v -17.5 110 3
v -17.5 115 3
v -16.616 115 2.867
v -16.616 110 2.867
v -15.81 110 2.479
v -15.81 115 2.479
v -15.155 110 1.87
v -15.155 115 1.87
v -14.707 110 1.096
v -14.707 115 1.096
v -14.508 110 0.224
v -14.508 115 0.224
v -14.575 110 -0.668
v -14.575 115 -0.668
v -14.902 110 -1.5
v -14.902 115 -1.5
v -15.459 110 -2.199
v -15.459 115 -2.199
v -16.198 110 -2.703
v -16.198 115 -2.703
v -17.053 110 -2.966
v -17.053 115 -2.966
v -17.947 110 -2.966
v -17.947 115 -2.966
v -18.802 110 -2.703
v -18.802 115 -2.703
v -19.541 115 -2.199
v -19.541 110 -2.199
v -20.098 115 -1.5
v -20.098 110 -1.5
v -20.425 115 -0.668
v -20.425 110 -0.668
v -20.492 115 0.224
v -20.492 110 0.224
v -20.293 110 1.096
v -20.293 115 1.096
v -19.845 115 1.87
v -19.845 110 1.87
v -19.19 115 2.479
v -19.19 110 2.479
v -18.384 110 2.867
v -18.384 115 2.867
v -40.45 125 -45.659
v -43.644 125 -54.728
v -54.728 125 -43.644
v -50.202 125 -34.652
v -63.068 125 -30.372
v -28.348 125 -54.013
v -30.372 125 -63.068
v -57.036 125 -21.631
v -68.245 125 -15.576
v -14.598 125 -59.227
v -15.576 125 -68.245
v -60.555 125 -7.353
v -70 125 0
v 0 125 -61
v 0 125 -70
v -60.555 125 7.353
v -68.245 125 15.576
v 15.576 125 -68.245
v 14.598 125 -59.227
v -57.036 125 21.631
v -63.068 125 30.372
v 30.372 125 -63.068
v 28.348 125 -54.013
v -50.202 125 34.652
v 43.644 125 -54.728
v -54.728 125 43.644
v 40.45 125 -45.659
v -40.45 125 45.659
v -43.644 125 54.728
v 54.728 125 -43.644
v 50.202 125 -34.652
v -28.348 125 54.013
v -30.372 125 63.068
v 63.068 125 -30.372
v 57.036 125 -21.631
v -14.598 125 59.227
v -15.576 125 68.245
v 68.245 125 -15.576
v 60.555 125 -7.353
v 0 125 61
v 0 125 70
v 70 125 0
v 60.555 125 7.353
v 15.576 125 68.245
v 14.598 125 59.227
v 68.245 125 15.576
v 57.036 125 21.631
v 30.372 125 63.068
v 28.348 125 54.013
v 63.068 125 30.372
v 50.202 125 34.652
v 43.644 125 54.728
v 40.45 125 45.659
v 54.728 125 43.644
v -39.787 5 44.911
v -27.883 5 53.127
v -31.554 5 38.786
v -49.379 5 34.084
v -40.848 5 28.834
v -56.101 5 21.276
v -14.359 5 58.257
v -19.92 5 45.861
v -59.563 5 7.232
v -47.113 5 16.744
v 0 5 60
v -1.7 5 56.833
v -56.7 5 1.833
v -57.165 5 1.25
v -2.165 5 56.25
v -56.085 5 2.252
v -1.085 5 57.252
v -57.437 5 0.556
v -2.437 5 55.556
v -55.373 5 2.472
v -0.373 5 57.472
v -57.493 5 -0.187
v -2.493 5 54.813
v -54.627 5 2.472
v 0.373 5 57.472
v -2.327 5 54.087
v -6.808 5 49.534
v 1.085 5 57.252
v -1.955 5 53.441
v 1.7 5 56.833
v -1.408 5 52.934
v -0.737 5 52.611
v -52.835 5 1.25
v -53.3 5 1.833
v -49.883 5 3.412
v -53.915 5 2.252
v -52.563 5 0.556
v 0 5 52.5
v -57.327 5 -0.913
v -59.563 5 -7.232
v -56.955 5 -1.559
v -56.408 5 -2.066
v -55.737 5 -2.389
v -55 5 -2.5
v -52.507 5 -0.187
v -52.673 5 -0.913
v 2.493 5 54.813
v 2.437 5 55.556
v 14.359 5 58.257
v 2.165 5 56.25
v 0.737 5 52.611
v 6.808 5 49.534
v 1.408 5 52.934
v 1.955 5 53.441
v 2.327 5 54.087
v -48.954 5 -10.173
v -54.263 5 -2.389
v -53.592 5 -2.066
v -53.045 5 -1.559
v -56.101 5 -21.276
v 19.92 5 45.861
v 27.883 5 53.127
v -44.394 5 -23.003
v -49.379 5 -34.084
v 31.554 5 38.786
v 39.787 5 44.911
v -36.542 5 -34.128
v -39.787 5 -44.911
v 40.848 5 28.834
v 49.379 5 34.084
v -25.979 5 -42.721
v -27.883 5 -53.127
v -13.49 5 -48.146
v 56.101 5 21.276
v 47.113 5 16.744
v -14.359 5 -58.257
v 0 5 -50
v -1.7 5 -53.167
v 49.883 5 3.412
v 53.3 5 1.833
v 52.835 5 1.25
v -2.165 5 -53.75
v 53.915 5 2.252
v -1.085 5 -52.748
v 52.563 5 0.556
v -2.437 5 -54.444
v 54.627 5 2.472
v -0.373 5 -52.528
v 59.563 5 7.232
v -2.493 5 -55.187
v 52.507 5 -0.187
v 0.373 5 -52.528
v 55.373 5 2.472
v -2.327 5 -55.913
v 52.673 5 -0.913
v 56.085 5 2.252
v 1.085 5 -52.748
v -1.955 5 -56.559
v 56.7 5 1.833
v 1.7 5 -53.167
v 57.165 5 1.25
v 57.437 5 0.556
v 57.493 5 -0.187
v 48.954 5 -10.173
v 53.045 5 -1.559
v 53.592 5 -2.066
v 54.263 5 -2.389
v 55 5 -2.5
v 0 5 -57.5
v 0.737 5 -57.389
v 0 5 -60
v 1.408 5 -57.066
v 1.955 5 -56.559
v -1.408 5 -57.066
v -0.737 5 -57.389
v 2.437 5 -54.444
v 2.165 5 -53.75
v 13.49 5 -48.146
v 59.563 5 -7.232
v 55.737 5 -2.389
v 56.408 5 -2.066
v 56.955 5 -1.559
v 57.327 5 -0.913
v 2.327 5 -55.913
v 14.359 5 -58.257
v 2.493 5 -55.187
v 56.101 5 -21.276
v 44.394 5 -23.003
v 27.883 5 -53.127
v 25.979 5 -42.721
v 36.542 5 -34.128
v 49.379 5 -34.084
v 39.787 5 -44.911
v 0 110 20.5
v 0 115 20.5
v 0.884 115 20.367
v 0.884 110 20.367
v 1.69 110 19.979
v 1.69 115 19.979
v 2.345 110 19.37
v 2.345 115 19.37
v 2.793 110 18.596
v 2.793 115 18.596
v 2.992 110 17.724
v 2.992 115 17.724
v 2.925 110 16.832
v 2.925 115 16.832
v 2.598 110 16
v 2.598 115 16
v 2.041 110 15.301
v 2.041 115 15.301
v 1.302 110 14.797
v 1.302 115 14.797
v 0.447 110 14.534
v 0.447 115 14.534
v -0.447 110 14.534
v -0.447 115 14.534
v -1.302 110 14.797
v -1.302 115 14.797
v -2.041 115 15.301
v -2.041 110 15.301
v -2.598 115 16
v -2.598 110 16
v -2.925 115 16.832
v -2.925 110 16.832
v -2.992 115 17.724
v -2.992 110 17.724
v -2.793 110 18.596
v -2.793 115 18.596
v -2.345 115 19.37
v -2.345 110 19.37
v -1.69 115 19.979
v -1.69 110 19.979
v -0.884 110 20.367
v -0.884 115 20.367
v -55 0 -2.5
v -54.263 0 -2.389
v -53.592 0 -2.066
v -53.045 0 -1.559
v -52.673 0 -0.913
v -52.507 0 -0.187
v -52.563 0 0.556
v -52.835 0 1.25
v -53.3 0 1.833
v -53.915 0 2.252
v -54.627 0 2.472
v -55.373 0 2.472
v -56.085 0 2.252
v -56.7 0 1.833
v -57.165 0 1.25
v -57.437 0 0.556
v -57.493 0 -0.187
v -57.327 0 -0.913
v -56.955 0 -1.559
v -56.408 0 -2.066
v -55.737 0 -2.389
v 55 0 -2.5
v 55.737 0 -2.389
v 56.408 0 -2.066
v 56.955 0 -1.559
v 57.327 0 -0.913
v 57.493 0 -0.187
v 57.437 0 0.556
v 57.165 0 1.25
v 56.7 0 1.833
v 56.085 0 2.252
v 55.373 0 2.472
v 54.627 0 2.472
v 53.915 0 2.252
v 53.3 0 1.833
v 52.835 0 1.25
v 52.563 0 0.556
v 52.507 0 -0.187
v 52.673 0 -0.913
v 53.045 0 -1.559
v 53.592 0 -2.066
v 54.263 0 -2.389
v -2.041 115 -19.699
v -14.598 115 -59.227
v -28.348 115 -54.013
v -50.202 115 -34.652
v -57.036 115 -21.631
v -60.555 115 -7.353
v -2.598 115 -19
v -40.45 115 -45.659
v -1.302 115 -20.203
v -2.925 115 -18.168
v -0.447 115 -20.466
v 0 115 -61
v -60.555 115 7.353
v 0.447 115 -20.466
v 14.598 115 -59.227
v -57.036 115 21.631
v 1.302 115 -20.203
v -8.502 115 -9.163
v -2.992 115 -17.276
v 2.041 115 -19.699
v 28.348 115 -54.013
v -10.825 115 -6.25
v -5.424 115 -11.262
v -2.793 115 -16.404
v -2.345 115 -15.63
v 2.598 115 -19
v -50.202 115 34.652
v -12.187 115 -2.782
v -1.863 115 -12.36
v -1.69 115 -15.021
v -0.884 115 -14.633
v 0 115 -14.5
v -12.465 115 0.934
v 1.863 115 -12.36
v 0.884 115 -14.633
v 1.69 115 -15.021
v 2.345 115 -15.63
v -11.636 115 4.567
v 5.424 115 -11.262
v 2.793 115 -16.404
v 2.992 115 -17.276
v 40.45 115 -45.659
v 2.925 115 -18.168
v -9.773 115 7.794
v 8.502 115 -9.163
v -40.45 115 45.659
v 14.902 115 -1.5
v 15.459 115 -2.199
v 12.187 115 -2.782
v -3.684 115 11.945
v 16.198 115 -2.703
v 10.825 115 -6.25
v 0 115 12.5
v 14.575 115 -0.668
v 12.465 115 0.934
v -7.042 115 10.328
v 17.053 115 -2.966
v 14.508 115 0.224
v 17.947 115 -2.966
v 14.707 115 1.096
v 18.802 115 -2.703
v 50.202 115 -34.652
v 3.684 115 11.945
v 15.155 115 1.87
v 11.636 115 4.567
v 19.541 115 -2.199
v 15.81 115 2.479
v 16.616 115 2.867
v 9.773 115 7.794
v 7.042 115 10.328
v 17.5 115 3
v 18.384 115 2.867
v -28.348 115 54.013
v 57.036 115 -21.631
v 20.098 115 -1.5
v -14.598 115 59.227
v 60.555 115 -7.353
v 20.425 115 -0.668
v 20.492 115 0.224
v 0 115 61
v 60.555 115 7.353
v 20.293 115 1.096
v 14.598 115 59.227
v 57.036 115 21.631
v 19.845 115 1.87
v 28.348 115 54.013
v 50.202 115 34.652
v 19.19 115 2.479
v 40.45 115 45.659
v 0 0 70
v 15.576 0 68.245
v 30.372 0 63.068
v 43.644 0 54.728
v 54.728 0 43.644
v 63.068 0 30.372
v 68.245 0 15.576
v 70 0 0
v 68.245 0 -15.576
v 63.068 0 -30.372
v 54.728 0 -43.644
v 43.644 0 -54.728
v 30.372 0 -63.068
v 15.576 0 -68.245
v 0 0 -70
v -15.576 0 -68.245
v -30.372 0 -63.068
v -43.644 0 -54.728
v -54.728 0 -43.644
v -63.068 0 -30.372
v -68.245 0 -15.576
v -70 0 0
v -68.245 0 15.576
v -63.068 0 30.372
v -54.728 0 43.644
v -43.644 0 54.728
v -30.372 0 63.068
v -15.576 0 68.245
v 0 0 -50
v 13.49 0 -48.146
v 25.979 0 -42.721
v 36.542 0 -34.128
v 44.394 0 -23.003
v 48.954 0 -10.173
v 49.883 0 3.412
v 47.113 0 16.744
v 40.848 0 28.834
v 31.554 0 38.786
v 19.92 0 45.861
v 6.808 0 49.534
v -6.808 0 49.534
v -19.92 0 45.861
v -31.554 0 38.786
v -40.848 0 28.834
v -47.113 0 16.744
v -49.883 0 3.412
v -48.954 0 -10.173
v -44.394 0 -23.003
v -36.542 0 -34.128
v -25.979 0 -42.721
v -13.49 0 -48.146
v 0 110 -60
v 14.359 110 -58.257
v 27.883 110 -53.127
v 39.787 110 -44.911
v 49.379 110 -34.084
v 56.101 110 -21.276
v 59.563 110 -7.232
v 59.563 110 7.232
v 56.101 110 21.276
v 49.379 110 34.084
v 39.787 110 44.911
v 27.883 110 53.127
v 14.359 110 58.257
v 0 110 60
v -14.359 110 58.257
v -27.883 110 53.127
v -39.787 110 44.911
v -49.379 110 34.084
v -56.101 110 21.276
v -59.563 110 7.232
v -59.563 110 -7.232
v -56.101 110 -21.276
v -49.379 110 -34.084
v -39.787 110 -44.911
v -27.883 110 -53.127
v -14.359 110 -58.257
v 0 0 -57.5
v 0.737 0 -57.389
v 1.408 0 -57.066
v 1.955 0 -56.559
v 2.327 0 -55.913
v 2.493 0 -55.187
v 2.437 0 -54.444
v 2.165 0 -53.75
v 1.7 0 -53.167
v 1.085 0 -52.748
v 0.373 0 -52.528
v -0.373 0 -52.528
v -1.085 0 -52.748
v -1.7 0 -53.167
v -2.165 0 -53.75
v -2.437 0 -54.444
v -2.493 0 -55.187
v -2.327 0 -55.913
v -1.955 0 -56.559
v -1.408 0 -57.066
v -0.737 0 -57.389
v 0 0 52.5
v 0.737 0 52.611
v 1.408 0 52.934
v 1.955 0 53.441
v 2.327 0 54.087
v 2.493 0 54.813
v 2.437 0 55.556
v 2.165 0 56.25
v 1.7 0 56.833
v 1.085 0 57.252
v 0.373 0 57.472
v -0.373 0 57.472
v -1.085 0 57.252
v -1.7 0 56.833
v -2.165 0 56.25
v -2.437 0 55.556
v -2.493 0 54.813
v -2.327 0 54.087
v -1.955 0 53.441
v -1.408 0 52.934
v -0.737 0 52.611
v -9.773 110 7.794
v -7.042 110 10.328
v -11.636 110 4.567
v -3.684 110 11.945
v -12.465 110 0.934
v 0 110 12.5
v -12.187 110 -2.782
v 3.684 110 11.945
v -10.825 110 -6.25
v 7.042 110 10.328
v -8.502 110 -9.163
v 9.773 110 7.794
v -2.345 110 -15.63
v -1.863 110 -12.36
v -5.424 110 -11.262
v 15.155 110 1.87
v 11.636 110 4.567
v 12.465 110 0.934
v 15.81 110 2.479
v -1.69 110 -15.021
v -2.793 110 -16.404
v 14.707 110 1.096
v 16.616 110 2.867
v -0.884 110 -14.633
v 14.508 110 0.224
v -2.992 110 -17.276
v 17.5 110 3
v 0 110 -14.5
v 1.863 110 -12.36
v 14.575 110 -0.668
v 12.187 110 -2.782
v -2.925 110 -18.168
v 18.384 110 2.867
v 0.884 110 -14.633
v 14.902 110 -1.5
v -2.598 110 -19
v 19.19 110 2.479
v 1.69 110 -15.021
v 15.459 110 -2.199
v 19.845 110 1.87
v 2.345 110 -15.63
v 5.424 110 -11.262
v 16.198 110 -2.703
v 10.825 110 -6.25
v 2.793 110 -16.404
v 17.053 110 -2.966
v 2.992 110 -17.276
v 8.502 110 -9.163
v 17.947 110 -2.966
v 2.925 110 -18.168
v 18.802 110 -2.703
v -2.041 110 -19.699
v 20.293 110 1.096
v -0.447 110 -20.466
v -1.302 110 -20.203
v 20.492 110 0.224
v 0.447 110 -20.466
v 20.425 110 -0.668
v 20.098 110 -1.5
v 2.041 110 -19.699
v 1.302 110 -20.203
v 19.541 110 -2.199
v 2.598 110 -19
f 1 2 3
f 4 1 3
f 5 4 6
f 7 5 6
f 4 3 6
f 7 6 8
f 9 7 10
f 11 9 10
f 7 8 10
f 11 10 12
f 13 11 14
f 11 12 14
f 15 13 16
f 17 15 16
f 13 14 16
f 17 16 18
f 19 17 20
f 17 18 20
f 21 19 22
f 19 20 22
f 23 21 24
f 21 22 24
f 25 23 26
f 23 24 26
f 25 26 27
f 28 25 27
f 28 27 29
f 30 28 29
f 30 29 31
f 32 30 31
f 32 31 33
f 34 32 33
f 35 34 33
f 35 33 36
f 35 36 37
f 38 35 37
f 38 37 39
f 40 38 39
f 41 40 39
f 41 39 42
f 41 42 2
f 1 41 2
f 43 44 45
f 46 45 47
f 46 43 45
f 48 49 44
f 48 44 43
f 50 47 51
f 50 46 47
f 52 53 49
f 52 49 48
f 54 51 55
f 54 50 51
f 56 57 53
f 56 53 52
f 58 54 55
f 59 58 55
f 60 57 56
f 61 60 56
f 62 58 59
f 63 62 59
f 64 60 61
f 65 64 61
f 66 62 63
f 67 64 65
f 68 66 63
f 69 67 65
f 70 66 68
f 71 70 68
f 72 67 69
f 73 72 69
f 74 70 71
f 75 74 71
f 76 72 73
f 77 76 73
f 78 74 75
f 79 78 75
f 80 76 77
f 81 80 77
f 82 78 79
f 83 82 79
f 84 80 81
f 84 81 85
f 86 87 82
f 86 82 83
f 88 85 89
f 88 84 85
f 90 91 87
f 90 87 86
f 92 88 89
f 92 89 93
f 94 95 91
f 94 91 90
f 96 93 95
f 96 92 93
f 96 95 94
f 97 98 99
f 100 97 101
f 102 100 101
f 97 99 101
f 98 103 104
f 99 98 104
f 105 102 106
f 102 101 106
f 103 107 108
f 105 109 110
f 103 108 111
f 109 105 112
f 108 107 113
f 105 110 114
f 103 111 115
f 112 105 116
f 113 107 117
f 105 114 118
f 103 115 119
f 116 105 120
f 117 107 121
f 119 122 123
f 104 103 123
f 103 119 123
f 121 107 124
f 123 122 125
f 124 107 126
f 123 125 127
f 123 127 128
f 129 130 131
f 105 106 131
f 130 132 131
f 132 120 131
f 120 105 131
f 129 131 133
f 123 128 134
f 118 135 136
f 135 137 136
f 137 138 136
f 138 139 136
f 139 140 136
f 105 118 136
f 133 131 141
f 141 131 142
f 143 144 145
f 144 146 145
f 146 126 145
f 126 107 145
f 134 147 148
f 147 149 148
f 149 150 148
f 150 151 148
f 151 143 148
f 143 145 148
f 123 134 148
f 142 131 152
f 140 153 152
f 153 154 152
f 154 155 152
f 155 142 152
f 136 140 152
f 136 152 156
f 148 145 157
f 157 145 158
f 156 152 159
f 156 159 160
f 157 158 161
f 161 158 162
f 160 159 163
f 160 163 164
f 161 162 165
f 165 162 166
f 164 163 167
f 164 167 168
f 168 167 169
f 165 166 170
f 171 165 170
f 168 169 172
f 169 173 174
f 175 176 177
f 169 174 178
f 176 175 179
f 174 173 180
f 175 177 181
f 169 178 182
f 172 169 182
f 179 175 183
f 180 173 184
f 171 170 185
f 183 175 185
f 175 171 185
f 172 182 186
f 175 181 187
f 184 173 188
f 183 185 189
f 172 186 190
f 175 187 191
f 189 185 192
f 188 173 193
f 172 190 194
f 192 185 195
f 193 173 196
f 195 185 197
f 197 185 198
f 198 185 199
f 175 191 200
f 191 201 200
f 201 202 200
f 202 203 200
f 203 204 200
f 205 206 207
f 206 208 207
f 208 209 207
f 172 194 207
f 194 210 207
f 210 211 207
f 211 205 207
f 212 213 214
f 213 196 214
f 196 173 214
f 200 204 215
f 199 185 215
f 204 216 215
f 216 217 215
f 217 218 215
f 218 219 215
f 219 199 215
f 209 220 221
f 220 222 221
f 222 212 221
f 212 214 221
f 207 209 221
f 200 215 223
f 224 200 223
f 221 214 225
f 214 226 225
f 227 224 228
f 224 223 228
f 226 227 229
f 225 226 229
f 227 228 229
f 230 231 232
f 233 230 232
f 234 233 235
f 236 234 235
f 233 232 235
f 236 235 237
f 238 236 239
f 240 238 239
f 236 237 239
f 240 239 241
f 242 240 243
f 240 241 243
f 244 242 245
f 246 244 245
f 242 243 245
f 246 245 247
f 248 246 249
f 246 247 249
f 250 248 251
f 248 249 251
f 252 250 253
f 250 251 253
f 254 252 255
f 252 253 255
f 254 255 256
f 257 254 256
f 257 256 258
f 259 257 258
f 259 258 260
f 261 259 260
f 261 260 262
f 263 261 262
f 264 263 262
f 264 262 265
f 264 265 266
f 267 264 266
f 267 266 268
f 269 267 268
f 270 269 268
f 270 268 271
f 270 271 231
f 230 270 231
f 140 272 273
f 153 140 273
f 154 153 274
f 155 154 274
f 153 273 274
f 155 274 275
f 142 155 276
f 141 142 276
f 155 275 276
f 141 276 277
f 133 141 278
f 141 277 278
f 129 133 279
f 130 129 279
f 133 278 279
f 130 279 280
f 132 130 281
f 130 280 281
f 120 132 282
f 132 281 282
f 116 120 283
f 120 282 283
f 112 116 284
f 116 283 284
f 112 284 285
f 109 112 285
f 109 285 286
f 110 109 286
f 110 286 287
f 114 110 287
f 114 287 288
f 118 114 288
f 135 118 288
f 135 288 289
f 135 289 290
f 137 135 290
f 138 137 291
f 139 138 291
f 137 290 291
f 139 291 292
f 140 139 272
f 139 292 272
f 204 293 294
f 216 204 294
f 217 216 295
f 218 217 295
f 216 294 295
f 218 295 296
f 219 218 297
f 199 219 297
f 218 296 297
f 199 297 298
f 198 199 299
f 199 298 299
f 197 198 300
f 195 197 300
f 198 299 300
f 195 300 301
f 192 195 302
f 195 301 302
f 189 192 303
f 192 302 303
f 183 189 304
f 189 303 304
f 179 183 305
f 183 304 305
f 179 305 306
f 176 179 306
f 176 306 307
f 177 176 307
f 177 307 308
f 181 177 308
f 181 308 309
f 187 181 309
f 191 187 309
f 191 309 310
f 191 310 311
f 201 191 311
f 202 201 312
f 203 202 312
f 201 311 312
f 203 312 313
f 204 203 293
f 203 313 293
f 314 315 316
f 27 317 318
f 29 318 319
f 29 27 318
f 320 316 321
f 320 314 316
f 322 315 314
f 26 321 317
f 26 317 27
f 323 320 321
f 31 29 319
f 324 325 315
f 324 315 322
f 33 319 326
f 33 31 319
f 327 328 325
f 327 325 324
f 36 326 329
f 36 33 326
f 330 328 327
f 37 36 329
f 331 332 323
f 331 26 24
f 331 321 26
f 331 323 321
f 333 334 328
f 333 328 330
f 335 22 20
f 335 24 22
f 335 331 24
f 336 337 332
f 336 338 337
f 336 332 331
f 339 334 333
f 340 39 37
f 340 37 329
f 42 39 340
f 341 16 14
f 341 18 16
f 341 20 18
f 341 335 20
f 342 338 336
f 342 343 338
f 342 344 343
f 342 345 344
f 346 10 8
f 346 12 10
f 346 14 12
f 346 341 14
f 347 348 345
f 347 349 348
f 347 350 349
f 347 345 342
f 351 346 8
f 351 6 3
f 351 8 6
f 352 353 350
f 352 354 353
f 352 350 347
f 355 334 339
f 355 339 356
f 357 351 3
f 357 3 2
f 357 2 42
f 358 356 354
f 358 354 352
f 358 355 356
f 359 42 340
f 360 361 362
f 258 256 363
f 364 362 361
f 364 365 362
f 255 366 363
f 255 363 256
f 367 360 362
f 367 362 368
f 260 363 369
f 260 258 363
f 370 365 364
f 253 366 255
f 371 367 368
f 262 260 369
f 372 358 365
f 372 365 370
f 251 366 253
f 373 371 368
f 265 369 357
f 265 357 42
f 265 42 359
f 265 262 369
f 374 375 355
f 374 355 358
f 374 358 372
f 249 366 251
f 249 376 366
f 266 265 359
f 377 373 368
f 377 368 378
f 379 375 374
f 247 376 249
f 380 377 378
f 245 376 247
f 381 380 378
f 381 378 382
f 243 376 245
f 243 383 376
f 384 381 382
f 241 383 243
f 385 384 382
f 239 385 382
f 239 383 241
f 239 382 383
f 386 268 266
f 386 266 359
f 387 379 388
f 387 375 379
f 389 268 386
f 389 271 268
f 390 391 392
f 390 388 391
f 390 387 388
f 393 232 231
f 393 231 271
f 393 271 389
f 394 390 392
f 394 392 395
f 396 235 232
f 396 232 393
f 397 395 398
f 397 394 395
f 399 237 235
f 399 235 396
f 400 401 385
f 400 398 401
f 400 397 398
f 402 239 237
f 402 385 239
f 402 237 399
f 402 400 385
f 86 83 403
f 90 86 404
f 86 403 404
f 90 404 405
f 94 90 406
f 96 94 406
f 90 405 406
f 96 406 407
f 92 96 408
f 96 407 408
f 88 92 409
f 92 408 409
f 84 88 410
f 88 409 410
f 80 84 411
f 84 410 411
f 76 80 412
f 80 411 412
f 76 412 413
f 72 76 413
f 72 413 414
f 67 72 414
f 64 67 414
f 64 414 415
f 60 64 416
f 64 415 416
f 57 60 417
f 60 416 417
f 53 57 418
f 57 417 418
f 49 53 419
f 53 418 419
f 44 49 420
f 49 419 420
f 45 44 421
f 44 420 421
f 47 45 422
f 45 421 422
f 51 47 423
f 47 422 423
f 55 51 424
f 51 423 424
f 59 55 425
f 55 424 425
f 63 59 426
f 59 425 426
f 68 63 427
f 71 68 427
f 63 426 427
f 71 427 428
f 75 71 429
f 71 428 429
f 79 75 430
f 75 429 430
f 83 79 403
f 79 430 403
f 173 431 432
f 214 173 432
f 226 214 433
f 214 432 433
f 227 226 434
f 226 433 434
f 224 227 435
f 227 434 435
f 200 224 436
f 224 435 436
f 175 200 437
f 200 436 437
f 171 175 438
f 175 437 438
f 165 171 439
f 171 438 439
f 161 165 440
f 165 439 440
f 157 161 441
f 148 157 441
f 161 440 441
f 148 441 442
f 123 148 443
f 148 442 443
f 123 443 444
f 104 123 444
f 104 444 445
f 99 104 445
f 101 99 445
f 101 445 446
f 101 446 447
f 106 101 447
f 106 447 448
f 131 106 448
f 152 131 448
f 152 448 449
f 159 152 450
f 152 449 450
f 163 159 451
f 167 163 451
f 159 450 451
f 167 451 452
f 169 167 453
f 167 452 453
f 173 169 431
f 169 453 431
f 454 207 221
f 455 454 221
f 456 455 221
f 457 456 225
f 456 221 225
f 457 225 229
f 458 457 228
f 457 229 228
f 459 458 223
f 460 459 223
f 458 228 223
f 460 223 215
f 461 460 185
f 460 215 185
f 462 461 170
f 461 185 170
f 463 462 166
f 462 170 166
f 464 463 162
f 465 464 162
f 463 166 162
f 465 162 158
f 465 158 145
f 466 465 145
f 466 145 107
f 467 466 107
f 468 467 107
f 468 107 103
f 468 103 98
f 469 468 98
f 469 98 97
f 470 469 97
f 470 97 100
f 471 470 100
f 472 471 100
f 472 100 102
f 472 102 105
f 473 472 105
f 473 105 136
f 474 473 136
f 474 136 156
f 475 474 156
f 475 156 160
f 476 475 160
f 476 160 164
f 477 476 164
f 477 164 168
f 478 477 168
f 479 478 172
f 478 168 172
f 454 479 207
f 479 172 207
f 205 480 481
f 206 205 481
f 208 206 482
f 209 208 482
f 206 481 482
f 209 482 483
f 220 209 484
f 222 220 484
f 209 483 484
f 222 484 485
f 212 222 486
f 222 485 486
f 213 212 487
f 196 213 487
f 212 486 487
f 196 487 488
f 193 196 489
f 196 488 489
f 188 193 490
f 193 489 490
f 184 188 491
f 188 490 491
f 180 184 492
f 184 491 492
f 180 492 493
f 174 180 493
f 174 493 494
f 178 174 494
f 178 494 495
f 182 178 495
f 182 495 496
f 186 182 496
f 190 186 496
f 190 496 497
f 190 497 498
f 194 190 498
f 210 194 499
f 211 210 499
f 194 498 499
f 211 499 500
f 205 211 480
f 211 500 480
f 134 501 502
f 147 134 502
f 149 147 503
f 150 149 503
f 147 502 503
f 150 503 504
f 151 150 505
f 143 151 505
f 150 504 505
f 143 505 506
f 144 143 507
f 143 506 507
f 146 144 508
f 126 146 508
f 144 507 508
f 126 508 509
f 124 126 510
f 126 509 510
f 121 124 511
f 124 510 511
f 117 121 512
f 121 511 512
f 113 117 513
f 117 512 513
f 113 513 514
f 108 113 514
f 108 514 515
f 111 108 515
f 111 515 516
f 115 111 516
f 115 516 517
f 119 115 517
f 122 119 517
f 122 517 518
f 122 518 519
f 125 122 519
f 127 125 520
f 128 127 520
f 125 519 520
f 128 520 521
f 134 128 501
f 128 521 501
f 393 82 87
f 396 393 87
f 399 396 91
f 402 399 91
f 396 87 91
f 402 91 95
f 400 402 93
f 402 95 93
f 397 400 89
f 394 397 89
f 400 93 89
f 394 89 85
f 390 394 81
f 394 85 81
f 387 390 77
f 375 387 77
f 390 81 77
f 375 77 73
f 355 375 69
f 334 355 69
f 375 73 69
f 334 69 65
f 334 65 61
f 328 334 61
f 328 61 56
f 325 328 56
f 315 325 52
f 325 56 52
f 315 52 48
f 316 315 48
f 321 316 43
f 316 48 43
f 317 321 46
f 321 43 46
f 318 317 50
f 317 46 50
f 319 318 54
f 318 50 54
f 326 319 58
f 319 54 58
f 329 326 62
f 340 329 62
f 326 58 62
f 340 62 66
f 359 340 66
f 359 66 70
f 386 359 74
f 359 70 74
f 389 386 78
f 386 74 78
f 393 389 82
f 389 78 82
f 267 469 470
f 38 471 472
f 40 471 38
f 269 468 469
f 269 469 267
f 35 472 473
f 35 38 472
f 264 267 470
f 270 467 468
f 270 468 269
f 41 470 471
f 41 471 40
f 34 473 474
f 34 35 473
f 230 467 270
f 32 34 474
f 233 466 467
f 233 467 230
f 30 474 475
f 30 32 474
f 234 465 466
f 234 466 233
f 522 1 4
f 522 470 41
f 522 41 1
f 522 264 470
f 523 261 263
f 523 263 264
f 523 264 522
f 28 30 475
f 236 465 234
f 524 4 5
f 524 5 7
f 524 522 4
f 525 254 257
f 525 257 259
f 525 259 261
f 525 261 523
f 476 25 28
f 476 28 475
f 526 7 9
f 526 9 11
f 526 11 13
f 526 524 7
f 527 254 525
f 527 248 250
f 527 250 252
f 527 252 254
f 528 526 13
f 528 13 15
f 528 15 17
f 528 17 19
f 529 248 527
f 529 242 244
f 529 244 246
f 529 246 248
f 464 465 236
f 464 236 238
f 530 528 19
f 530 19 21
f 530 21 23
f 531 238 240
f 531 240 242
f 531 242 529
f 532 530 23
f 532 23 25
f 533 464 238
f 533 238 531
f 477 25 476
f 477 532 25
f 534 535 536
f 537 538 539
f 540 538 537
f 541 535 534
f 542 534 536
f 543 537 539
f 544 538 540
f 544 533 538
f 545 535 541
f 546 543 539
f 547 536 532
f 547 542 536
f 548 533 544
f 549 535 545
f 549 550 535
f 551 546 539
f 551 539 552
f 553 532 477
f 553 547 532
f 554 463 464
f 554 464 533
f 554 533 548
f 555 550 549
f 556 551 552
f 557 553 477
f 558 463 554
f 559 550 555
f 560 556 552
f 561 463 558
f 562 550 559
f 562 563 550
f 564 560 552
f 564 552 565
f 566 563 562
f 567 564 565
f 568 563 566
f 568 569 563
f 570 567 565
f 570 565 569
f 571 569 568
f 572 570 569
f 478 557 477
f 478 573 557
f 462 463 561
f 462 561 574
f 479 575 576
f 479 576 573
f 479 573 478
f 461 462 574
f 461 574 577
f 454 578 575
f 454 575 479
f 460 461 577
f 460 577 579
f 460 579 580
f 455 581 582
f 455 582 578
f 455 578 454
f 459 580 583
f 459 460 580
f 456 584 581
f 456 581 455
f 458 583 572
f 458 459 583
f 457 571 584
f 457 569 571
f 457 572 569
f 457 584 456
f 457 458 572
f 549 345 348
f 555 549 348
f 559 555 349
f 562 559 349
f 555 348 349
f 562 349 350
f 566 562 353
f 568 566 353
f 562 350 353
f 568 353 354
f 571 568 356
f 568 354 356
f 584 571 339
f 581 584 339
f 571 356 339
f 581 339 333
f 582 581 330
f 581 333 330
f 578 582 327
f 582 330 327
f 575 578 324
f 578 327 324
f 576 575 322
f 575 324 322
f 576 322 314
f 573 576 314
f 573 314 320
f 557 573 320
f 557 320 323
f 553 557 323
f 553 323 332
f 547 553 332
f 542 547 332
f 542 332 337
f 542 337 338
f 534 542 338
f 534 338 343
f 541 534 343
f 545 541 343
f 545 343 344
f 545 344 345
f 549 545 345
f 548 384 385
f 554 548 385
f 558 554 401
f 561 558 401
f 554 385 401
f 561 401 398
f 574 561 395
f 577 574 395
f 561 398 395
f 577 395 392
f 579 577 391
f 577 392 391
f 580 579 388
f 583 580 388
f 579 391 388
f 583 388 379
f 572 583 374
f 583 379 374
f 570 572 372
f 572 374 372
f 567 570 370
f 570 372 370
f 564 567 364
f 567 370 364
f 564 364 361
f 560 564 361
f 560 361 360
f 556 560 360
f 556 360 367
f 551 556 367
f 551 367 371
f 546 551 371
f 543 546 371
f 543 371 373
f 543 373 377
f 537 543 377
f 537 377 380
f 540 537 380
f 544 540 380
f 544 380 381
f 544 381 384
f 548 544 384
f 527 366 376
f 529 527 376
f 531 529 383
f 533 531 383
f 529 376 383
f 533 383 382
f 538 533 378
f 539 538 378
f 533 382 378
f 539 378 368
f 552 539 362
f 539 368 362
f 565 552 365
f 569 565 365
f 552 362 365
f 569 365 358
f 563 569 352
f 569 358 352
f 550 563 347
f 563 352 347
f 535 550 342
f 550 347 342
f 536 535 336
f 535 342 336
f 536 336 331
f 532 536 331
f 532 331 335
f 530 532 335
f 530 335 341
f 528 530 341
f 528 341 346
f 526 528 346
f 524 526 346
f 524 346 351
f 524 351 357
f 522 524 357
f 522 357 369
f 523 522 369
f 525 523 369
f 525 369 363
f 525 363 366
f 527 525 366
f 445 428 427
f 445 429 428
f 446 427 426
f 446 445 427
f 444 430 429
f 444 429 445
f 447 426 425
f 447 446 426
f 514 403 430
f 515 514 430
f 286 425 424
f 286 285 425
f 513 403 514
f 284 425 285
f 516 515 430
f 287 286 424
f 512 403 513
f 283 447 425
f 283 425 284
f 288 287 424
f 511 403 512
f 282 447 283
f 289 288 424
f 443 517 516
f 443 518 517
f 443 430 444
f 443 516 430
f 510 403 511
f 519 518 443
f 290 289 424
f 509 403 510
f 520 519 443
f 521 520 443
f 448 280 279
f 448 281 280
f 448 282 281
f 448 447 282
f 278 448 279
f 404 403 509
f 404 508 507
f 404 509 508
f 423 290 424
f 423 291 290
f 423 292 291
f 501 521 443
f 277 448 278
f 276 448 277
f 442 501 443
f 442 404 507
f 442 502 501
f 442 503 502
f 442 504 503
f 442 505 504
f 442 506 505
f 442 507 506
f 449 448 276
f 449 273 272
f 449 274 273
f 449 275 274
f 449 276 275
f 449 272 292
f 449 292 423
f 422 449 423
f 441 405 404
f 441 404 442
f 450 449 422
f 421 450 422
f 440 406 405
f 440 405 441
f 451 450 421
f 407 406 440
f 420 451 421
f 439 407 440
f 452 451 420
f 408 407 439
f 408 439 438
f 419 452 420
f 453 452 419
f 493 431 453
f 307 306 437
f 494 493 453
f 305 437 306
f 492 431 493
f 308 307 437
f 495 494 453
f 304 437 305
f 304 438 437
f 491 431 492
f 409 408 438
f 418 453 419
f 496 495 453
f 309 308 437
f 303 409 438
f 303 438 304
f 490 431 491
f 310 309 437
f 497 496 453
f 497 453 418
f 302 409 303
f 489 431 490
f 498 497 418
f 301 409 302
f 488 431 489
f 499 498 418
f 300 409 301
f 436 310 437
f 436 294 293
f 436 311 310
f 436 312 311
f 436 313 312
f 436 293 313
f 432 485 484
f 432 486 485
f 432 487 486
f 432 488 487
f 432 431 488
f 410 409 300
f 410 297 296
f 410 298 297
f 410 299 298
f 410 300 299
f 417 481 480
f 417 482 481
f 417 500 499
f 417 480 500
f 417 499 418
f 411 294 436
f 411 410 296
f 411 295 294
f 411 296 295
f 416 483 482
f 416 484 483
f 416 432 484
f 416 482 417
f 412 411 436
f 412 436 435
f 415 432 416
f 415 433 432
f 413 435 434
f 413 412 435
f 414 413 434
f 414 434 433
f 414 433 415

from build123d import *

# Parameters (mm, degrees)
SKETCH_1_R          = 70
EXTRUDE_1_DEPTH     = 125
SKETCH_4_R          = 60
CUT_EXTRUDE_4_DEPTH = 110
SKETCH_5_R          = 61
CUT_EXTRUDE_5_DEPTH = 10
SKETCH_6_R          = 12.5
SKETCH_6_R_2        = 3
CUT_EXTRUDE_6_DEPTH = 152.739909055
SKETCH_7_R          = 60
SKETCH_7_R_2        = 50
EXTRUDE_2_DEPTH     = 5
SKETCH_8_R          = 2.5
CUT_EXTRUDE_7_DEPTH = 5


with BuildPart() as part:
    # 스케치1 → 보스-돌출1 (new body)
    with BuildSketch(Plane(origin=(0, 0, 0), x_dir=(1, 0, 0), z_dir=(0, 1, 0))):
        with Locations(Location((0, 0, 0), (0, 0, 270))):
            Circle(SKETCH_1_R)
    extrude(amount=EXTRUDE_1_DEPTH)

    # 스케치4 → 컷-돌출4 (cut)
    with BuildSketch(Plane.XZ):
        with Locations(Location((0, 0, 0), (0, 0, 270))):
            Circle(SKETCH_4_R)
    extrude(amount=-CUT_EXTRUDE_4_DEPTH, mode=Mode.SUBTRACT)

    # 스케치5 → 컷-돌출5 (cut)
    with BuildSketch(Plane(origin=(0, 125, 0), x_dir=(1, 0, 0), z_dir=(0, 1, 0))):
        with Locations(Location((0, 0, 0), (0, 0, 270))):
            Circle(SKETCH_5_R)
    extrude(amount=-CUT_EXTRUDE_5_DEPTH, mode=Mode.SUBTRACT)

    # 스케치6 → 컷-돌출6 (cut, through all)
    with BuildSketch(Plane(origin=(0, 115, 0), x_dir=(1, 0, 0), z_dir=(0, 1, 0))):
        with Locations(Location((0, 0, 0), (0, 0, 270))):
            Circle(SKETCH_6_R)
        with Locations(Location((0, -17.5, 0), (0, 0, 270))):
            Circle(SKETCH_6_R_2)
        with Locations(Location((-17.5, 0, 0), (0, 0, 270))):
            Circle(SKETCH_6_R_2)
        with Locations(Location((0, 17.5, 0), (0, 0, 270))):
            Circle(SKETCH_6_R_2)
        with Locations(Location((17.5, 0, 0), (0, 0, 270))):
            Circle(SKETCH_6_R_2)
    extrude(amount=-CUT_EXTRUDE_6_DEPTH, mode=Mode.SUBTRACT)

    # 스케치7 → 보스-돌출2 (add)
    with BuildSketch(Plane.XZ):
        with Locations(Location((0, 0, 0), (0, 0, 270))):
            Circle(SKETCH_7_R)
        with Locations(Location((0, 0, 0), (0, 0, 270))):
            Circle(SKETCH_7_R_2, mode=Mode.SUBTRACT)
    extrude(amount=-EXTRUDE_2_DEPTH)

    # 스케치8 → 컷-돌출7 (cut)
    with BuildSketch(Plane.XZ):
        with Locations(Location((0, -55, 0), (0, 0, 270))):
            Circle(SKETCH_8_R)
        with Locations(Location((-55, 0, 0), (0, 0, 270))):
            Circle(SKETCH_8_R)
        with Locations(Location((0, 55, 0), (0, 0, 270))):
            Circle(SKETCH_8_R)
        with Locations(Location((55, 0, 0), (0, 0, 270))):
            Circle(SKETCH_8_R)
    extrude(amount=-CUT_EXTRUDE_7_DEPTH, mode=Mode.SUBTRACT)


solid = part.part
